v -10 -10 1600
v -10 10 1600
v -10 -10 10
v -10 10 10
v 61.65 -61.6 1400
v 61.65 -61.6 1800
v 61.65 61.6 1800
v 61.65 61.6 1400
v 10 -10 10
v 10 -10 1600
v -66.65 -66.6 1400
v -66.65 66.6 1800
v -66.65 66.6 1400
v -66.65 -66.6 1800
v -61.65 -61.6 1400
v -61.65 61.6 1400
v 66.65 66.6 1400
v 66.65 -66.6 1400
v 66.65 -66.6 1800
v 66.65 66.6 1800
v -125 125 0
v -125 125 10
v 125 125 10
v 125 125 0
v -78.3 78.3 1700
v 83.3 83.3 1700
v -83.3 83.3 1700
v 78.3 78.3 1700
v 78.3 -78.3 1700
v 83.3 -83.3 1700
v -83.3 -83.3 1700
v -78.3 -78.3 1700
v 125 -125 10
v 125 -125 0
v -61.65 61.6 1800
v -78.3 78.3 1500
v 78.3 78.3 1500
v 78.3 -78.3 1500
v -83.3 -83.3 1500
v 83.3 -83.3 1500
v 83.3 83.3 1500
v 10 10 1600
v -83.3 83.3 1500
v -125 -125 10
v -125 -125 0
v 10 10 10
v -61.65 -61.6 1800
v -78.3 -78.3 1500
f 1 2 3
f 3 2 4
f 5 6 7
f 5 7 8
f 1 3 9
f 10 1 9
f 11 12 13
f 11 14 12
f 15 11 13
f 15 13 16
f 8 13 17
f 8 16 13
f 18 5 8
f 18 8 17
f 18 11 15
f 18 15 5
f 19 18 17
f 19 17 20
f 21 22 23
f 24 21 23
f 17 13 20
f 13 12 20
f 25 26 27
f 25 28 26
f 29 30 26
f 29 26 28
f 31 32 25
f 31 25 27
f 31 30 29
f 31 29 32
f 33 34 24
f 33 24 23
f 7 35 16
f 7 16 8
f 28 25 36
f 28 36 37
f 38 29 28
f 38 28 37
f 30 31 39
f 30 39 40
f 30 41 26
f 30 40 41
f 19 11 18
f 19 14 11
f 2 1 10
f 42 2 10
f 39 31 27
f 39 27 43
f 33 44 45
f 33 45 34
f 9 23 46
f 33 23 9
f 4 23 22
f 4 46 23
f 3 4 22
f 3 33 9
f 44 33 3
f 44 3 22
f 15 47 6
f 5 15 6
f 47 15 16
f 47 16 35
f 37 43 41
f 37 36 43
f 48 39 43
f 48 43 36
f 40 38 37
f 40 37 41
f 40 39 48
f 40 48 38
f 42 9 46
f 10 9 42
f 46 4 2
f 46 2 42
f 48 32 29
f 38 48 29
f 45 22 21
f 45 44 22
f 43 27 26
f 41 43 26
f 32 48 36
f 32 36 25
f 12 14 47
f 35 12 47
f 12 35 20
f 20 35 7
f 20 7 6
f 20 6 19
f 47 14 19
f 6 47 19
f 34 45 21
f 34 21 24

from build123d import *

# Parameters (mm, degrees)
F1_DEPTH      = 125
F1_DEPTH_BACK = 125
F0_W          = 20
F0_H          = 1390
F0_H_2        = 5
F0_H_3        = 95
F2_DEPTH      = 10
F2_DEPTH_BACK = 10
F3_DEPTH      = 83.3
F4_START      = 78.3
F0_W_2        = 11.65
F0_W_3        = 61.65
F0_W_4        = 5
F0_H_4        = 190
F0_W_5        = 51.65
F4_DEPTH      = 5
F5_DEPTH      = 66.6
F6_START      = 61.6
F0_W_6        = 123.3
F6_DEPTH      = 5


with BuildPart() as f1:
    # F0 (on Front) → F1 (new body, two sides)
    with BuildSketch(Plane.XZ) as f1_sk:
        Polygon((10, 10), (-10, 10), (-125, 10), (-125, 0), (125, 0), (125, 10), align=None)
    extrude(amount=F1_DEPTH)
    extrude(f1_sk.sketch, amount=-F1_DEPTH_BACK)

    # F0 (on Front) → F2 (join, two sides)
    with BuildSketch(Plane.XZ) as f2_sk:
        with Locations((0, 705)):
            Rectangle(F0_W, F0_H)
        with Locations((0, 1402.5)):
            Rectangle(F0_W, F0_H_2)
        with Locations((0, 1452.5)):
            Rectangle(F0_W, F0_H_3)
        with Locations((0, 1502.5)):
            Rectangle(F0_W, F0_H_2)
        with Locations((0, 1552.5)):
            Rectangle(F0_W, F0_H_3)
    extrude(amount=F2_DEPTH)
    extrude(f2_sk.sketch, amount=-F2_DEPTH_BACK)


with BuildPart() as f3:
    # F0 (on Front) → F3 (new body)
    with BuildSketch(Plane.XZ):
        Polygon((-78.3, 1700), (-83.3, 1700), (-83.3, 1500), (-78.3, 1500), (-78.3, 1505), (-78.3, 1695), align=None)
    extrude(amount=F3_DEPTH)



with BuildPart() as f3b:
    # F0 (on Front) → F3, piece 2 (new body)
    with BuildSketch(Plane.XZ):
        Polygon((83.3, 1700), (78.3, 1700), (78.3, 1695), (78.3, 1505), (78.3, 1500), (83.3, 1500), align=None)
    extrude(amount=F3_DEPTH)


with BuildPart() as f3_1:
    add(f3.part)

    add(f3b.part)  # F4 merges F3b
    # F0 (on Front) → F4 (join)
    with BuildSketch(Plane.XZ.offset(F4_START)):
        with Locations((72.475, 1697.5)):
            Rectangle(F0_W_2, F0_H_2)
        with Locations((30.825, 1697.5)):
            Rectangle(F0_W_3, F0_H_2)
        with Locations((64.15, 1697.5)):
            Rectangle(F0_W_4, F0_H_2)
        with Locations((-30.825, 1697.5)):
            Rectangle(F0_W_3, F0_H_2)
        with Locations((-72.475, 1697.5)):
            Rectangle(F0_W_2, F0_H_2)
        with Locations((-64.15, 1697.5)):
            Rectangle(F0_W_4, F0_H_2)
        with Locations((-72.475, 1600)):
            Rectangle(F0_W_2, F0_H_4)
        with Locations((-64.15, 1600)):
            Rectangle(F0_W_4, F0_H_4)
        with Locations((64.15, 1600)):
            Rectangle(F0_W_4, F0_H_4)
        with Locations((72.475, 1600)):
            Rectangle(F0_W_2, F0_H_4)
        Polygon((0, 1695), (-61.65, 1695), (-61.65, 1505), (-10, 1505), (-10, 1600), (10, 1600), (10, 1505), (61.65, 1505), (61.65, 1695), align=None)
        with Locations((0, 1552.5)):
            Rectangle(F0_W, F0_H_3)
        with Locations((72.475, 1502.5)):
            Rectangle(F0_W_2, F0_H_2)
        with Locations((64.15, 1502.5)):
            Rectangle(F0_W_4, F0_H_2)
        with Locations((35.825, 1502.5)):
            Rectangle(F0_W_5, F0_H_2)
        with Locations((0, 1502.5)):
            Rectangle(F0_W, F0_H_2)
        with Locations((-35.825, 1502.5)):
            Rectangle(F0_W_5, F0_H_2)
        with Locations((-64.15, 1502.5)):
            Rectangle(F0_W_4, F0_H_2)
        with Locations((-72.475, 1502.5)):
            Rectangle(F0_W_2, F0_H_2)
    extrude(amount=F4_DEPTH)



with BuildPart() as f5:
    # F0 (on Front) → F5 (new body)
    with BuildSketch(Plane.XZ):
        Polygon((61.65, 1795), (61.65, 1700), (66.65, 1700), (66.65, 1800), (61.65, 1800), align=None)
        with Locations((64.15, 1697.5)):
            Rectangle(F0_W_4, F0_H_2)
        with Locations((64.15, 1600)):
            Rectangle(F0_W_4, F0_H_4)
        with Locations((64.15, 1502.5)):
            Rectangle(F0_W_4, F0_H_2)
        Polygon((66.65, 1500), (61.65, 1500), (61.65, 1405), (61.65, 1400), (66.65, 1400), align=None)
    extrude(amount=F5_DEPTH)



with BuildPart() as f5b:
    # F0 (on Front) → F5, piece 2 (new body)
    with BuildSketch(Plane.XZ):
        Polygon((-61.65, 1500), (-66.65, 1500), (-66.65, 1400), (-61.65, 1400), (-61.65, 1405), align=None)
        with Locations((-64.15, 1502.5)):
            Rectangle(F0_W_4, F0_H_2)
        with Locations((-64.15, 1600)):
            Rectangle(F0_W_4, F0_H_4)
        Polygon((-66.65, 1800), (-66.65, 1700), (-61.65, 1700), (-61.65, 1795), (-61.65, 1800), align=None)
        with Locations((-64.15, 1697.5)):
            Rectangle(F0_W_4, F0_H_2)
    extrude(amount=F5_DEPTH)


with BuildPart() as f5_1:
    add(f5.part)

    add(f5b.part)  # F6 merges F5b
    # F0 (on Front) → F6 (join)
    with BuildSketch(Plane.XZ.offset(F6_START)):
        with Locations((0, 1797.5)):
            Rectangle(F0_W_6, F0_H_2)
        Polygon((-61.65, 1795), (-61.65, 1700), (0, 1700), (61.65, 1700), (61.65, 1795), align=None)
        with Locations((30.825, 1697.5)):
            Rectangle(F0_W_3, F0_H_2)
        with Locations((-30.825, 1697.5)):
            Rectangle(F0_W_3, F0_H_2)
        Polygon((0, 1695), (-61.65, 1695), (-61.65, 1505), (-10, 1505), (-10, 1600), (10, 1600), (10, 1505), (61.65, 1505), (61.65, 1695), align=None)
        with Locations((0, 1552.5)):
            Rectangle(F0_W, F0_H_3)
        with Locations((0, 1502.5)):
            Rectangle(F0_W, F0_H_2)
        with Locations((-35.825, 1502.5)):
            Rectangle(F0_W_5, F0_H_2)
        with Locations((35.825, 1502.5)):
            Rectangle(F0_W_5, F0_H_2)
        with Locations((35.825, 1452.5)):
            Rectangle(F0_W_5, F0_H_3)
        with Locations((-35.825, 1452.5)):
            Rectangle(F0_W_5, F0_H_3)
        with Locations((0, 1452.5)):
            Rectangle(F0_W, F0_H_3)
        with Locations((35.825, 1402.5)):
            Rectangle(F0_W_5, F0_H_2)
        with Locations((0, 1402.5)):
            Rectangle(F0_W, F0_H_2)
        with Locations((-35.825, 1402.5)):
            Rectangle(F0_W_5, F0_H_2)
    extrude(amount=F6_DEPTH)


with BuildPart() as f3_2:
    add(f3_1.part)

    add(f5_1.part)  # F7 merges F5
    # F7: F5, F3 across plane
    add(f5_1.part.mirror(Plane.XZ))
    add(f3_1.part.mirror(Plane.XZ))


solid = Compound([f1.part, f3_2.part])
